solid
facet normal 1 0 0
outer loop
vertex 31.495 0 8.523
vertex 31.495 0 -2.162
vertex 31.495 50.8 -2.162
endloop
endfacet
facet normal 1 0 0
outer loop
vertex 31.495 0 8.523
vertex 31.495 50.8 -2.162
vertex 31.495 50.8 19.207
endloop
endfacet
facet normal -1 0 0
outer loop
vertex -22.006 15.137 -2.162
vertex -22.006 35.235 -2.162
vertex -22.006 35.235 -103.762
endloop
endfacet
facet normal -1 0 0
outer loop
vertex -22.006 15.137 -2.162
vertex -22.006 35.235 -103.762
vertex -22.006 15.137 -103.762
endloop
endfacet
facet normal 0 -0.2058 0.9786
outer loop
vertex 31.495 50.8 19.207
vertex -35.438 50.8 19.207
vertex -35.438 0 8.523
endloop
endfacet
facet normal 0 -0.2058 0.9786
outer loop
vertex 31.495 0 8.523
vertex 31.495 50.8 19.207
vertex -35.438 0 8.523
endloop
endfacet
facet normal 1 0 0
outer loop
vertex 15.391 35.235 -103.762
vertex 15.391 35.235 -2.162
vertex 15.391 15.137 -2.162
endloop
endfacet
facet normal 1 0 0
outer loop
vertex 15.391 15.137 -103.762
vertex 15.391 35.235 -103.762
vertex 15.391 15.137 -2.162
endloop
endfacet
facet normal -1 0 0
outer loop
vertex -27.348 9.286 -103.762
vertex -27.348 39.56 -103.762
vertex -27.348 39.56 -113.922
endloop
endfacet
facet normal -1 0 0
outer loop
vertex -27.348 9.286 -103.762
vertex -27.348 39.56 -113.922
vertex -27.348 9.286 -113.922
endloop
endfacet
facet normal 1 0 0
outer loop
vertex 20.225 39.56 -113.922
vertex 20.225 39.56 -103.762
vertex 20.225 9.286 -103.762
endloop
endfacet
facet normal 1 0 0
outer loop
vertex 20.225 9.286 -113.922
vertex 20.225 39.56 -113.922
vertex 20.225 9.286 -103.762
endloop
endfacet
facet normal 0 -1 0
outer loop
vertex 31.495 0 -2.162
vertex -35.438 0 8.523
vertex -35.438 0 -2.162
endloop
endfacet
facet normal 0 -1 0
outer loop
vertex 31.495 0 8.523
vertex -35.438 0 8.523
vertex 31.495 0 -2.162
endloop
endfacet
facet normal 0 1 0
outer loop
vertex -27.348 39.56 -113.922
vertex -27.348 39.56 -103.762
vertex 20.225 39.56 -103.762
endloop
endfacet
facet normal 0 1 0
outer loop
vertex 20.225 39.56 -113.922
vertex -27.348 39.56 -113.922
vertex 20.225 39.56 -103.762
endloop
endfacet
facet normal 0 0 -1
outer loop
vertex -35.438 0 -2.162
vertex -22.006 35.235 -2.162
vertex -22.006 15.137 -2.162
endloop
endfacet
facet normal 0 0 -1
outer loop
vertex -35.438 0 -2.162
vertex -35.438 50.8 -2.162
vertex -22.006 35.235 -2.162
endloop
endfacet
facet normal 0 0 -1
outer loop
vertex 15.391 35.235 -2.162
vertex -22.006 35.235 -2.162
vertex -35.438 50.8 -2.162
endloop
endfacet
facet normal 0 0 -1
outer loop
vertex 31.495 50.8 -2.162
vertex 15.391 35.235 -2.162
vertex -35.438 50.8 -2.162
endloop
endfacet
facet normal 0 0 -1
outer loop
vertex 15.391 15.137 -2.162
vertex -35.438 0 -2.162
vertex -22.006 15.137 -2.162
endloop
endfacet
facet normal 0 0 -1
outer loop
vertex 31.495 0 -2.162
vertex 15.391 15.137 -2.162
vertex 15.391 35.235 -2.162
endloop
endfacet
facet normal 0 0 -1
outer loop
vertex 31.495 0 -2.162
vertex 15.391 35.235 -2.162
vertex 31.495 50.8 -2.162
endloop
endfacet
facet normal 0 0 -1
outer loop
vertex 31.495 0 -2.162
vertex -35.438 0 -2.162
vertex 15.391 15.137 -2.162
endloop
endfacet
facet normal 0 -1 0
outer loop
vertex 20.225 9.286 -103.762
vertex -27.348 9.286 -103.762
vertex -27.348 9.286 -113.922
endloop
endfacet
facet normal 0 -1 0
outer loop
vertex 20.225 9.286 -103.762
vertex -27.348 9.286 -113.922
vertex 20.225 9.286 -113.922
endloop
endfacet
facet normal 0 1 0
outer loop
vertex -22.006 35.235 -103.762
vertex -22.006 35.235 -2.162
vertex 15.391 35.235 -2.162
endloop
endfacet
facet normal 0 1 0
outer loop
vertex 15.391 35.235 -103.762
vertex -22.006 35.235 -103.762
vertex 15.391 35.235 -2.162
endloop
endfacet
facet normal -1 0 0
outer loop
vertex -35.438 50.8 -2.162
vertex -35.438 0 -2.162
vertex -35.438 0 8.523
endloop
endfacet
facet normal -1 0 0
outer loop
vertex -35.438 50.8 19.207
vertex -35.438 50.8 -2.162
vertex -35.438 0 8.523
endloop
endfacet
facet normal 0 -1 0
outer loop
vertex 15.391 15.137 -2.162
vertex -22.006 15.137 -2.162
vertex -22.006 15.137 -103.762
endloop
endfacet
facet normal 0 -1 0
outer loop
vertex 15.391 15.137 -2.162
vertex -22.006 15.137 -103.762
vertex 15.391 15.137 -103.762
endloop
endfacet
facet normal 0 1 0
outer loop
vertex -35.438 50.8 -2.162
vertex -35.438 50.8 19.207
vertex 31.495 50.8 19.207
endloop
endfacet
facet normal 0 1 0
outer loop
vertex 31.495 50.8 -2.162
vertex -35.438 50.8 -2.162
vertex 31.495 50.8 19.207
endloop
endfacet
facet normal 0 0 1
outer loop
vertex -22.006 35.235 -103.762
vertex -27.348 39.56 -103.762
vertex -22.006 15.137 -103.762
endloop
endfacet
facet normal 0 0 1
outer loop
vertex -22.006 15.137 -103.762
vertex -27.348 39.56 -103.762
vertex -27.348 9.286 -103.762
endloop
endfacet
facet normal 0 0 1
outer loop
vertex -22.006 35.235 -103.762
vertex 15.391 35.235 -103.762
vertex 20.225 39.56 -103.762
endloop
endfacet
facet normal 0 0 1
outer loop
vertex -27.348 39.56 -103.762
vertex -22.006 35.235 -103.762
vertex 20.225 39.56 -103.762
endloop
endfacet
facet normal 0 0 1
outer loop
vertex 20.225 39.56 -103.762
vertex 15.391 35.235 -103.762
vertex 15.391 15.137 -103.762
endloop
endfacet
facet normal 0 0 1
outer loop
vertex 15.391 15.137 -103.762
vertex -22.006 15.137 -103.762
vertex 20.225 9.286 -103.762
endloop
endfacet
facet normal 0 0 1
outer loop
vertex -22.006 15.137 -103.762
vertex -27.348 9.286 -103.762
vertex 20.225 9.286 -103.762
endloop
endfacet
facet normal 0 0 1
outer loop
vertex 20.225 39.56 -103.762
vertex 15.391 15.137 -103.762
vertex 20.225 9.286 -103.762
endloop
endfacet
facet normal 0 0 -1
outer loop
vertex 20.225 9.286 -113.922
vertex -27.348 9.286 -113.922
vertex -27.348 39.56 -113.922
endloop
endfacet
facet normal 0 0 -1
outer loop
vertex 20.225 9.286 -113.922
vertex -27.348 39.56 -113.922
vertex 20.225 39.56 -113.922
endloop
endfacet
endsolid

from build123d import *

# Parameters (mm, degrees)
F0_W     = 66.933575
F0_H     = 21.369922
F1_DEPTH = 50.8
F3_DEPTH = 76.2
F4_W     = 37.397362
F4_H     = 20.0979
F5_DEPTH = 101.6
F6_W     = 47.573516
F6_H     = 30.274053
F7_DEPTH = 10.16


with BuildPart() as f1:
    # F0 (on Front) → F1 (new body)
    with BuildSketch(Plane.XZ):
        with Locations((-1.971668, 8.522528)):
            Rectangle(F0_W, F0_H)
    extrude(amount=-F1_DEPTH)

    # F2 (on face) → F3 (cut)
    with BuildSketch(Plane(origin=(-35.438456, 0, 0), x_dir=(0, -1, 0), z_dir=(-1, 0, 0))):
        Polygon((0, 19.207489), (-50.8, 19.207489), (0, 8.522528), align=None)
    extrude(amount=-F3_DEPTH, mode=Mode.SUBTRACT)

    # F4 (on face) → F5 (join)
    with BuildSketch(Plane(origin=(0, 0, -2.162433), x_dir=(1, 0, 0), z_dir=(0, 0, -1))):
        with Locations((-3.30725, -25.185978)):
            Rectangle(F4_W, F4_H)
    extrude(amount=F5_DEPTH)

    # F6 (on face) → F7 (join)
    with BuildSketch(Plane(origin=(0, 0, -103.762433), x_dir=(1, 0, 0), z_dir=(0, 0, -1))):
        with Locations((-3.561654, -24.422762)):
            Rectangle(F6_W, F6_H)
    extrude(amount=F7_DEPTH)


solid = f1.part
